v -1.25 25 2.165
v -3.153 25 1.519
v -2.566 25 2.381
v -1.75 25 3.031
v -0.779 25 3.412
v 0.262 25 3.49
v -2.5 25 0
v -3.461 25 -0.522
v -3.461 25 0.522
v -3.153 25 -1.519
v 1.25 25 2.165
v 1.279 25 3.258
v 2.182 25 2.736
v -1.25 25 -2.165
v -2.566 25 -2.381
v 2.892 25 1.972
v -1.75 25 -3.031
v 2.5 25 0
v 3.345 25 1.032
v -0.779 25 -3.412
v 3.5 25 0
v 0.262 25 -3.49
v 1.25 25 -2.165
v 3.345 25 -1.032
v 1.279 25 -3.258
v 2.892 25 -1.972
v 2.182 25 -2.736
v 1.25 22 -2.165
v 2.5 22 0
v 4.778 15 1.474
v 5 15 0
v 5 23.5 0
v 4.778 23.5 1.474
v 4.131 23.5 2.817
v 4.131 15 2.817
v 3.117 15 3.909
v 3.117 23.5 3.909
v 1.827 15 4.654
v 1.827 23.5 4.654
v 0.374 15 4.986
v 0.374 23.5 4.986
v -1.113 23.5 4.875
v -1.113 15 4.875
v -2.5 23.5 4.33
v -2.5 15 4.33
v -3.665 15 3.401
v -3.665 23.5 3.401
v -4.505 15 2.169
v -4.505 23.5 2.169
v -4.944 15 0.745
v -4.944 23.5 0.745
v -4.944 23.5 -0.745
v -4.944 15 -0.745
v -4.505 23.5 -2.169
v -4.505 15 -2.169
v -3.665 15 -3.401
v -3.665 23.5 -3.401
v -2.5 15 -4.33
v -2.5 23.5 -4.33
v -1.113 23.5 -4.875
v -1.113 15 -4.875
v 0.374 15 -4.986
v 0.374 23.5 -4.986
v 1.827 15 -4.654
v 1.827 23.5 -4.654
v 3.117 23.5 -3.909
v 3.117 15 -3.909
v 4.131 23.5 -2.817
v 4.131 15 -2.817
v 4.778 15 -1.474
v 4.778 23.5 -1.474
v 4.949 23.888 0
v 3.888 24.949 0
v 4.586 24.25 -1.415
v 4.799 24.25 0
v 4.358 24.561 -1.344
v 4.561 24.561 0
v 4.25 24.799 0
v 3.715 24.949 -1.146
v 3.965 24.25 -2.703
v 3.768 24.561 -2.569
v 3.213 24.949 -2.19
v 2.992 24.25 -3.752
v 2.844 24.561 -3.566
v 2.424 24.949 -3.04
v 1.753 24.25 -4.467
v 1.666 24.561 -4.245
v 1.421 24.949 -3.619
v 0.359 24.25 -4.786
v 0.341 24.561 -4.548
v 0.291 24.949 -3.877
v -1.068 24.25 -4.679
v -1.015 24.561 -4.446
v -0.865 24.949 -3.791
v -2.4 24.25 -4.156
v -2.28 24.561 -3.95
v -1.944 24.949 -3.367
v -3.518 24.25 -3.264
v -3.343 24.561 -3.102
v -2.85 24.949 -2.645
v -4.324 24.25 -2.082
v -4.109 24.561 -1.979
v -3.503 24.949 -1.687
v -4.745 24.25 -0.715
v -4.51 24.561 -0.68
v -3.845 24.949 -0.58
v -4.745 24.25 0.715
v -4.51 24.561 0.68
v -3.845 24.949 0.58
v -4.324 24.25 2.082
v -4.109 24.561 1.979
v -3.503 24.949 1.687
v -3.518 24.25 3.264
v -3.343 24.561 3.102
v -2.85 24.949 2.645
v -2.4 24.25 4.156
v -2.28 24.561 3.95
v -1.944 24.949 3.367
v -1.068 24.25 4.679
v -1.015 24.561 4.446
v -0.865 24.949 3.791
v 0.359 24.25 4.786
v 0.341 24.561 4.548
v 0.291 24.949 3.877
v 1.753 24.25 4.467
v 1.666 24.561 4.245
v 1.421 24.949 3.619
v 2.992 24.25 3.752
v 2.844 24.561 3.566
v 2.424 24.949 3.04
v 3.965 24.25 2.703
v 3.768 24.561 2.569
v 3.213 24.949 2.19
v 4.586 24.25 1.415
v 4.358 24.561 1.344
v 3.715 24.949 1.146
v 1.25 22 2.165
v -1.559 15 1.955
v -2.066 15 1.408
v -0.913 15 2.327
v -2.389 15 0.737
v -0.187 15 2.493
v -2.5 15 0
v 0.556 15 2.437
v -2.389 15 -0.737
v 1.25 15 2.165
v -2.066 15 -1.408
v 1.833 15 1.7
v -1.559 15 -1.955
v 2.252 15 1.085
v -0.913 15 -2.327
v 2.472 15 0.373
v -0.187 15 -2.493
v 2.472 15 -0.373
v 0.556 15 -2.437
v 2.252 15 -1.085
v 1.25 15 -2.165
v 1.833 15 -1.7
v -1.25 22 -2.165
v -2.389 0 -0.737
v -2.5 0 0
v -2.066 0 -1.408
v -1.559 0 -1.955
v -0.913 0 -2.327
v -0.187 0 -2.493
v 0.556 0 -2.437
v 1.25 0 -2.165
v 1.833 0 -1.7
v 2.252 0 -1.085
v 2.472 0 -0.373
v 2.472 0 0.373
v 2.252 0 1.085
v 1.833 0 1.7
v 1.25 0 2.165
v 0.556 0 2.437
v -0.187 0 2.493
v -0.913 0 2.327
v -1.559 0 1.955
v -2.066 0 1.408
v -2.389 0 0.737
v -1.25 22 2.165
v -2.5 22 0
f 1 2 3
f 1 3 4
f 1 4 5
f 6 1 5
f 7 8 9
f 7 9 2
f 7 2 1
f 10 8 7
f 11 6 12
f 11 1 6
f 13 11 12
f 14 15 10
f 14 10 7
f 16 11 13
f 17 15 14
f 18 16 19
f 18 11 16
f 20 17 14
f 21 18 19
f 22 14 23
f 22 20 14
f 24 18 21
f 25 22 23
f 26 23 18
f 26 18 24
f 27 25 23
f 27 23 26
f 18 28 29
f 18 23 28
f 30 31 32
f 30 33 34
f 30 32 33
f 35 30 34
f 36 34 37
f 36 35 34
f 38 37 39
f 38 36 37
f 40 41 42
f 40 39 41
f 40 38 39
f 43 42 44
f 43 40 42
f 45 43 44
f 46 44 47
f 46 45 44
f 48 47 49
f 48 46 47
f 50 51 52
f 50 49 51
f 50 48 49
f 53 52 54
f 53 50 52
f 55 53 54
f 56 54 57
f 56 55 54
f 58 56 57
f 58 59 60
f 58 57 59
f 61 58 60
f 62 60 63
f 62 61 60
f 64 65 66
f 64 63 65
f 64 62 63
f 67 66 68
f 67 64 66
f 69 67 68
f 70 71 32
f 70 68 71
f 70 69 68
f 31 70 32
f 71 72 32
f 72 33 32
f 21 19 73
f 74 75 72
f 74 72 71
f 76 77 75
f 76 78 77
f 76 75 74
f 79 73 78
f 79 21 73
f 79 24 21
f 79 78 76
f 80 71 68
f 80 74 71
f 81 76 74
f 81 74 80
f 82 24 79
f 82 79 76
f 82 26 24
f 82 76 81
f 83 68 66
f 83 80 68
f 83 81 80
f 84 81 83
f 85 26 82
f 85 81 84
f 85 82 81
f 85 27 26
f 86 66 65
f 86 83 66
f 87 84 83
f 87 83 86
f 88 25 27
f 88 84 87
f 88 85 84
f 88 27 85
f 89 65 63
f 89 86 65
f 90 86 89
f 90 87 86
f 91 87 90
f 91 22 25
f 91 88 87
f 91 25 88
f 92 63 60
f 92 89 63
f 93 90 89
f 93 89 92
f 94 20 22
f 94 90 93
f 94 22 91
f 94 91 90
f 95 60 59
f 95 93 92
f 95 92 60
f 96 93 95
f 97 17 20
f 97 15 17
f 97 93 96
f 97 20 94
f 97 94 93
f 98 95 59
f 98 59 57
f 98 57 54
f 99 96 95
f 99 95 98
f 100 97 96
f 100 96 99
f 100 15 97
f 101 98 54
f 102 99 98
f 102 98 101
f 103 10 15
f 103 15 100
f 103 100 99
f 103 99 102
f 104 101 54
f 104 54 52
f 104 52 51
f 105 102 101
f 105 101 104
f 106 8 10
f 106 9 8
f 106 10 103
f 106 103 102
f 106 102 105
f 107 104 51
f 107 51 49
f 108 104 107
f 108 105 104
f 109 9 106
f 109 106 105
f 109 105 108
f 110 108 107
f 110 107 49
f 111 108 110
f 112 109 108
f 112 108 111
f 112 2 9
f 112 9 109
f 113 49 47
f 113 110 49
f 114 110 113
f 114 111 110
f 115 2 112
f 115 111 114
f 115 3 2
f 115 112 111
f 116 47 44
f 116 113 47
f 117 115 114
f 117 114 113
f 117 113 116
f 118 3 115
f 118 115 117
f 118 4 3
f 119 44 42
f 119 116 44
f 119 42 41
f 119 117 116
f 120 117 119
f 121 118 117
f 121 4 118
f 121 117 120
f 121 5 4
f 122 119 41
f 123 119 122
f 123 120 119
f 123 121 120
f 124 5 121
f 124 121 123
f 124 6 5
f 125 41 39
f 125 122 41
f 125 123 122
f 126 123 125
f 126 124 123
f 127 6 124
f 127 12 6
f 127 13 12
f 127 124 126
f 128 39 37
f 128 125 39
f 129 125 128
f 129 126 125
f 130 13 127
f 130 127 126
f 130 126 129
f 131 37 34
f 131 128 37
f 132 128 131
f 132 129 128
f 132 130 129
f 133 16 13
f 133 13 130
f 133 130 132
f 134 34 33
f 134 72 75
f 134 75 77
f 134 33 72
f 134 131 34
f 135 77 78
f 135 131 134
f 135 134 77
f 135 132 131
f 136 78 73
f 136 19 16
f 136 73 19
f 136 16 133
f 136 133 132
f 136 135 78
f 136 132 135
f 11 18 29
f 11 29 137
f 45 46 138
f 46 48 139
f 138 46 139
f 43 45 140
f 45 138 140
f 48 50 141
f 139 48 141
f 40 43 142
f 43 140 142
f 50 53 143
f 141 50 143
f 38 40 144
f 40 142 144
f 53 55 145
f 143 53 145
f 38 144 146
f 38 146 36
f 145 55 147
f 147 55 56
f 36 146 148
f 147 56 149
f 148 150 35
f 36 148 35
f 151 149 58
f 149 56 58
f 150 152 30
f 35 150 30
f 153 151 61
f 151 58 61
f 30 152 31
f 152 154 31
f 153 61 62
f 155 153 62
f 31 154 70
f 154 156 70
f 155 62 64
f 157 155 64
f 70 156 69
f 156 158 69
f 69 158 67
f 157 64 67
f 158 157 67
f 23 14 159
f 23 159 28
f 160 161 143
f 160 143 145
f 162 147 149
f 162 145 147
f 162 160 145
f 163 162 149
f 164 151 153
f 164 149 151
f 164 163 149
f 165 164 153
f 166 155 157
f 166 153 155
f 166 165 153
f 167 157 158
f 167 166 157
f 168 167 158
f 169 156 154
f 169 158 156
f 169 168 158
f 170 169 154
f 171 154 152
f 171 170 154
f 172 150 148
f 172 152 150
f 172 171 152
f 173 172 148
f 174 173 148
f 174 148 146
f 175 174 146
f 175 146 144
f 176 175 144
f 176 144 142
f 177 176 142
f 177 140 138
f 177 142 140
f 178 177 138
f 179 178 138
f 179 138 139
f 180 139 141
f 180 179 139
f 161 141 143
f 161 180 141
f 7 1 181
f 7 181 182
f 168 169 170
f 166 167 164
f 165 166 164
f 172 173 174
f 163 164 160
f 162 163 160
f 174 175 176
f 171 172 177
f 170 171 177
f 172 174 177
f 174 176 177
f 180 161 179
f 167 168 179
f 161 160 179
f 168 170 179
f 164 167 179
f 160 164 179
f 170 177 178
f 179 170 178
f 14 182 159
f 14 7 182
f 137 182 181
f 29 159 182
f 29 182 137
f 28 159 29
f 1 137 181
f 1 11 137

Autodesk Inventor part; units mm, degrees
ref_plane "YZ Plane" through (0, 0, 0) normal (1, 0, 0) x (0, 1, 0)
ref_plane "XZ Plane" through (0, 0, 0) normal (0, 1, 0) x (-1, 0, 0)
ref_plane "XY Plane" through (0, 0, 0) normal (0, 0, 1) x (1, 0, 0)
sketch "Sketch1" plane through (0, 0, 0) normal (0, 1, 0) x (-1, 0, 0)
  circle A0 centre (0, 0) radius 2.5
  dimension "d0" = 5
extrude "Extrusion1" add sketch "Sketch1" along normal blind 15
sketch "Sketch2" plane through (0, 15, 0) normal (0, 1, 0) x (1, 0, 0)
  circle A0 centre (0, 0) radius 5
extrude "Extrusion2" add sketch "Sketch2" along normal blind 10
sketch "Sketch3" plane through (0, 25, 0) normal (0, 1, 0) x (1, 0, 0)
  circle A0 centre (0, 0) radius 2.5 projected
  line L0 (2.5, 0) -> (1.25, -2.1651)
  line L1 (1.25, -2.1651) -> (-1.25, -2.1651)
  line L2 (-1.25, -2.1651) -> (-2.5, 0)
  line L3 (-2.5, 0) -> (-1.25, 2.1651)
  line L4 (-1.25, 2.1651) -> (1.25, 2.1651)
  line L5 (1.25, 2.1651) -> (2.5, 0)
fillet "Fillet1" radius 1.5 1 edges at (-5, 25, 0)
extrude "Extrusion3" cut sketch "Sketch3" against normal blind 3 contours L0 L1 L2 L3 L4 L5
properties part number "35mm_bolt"
